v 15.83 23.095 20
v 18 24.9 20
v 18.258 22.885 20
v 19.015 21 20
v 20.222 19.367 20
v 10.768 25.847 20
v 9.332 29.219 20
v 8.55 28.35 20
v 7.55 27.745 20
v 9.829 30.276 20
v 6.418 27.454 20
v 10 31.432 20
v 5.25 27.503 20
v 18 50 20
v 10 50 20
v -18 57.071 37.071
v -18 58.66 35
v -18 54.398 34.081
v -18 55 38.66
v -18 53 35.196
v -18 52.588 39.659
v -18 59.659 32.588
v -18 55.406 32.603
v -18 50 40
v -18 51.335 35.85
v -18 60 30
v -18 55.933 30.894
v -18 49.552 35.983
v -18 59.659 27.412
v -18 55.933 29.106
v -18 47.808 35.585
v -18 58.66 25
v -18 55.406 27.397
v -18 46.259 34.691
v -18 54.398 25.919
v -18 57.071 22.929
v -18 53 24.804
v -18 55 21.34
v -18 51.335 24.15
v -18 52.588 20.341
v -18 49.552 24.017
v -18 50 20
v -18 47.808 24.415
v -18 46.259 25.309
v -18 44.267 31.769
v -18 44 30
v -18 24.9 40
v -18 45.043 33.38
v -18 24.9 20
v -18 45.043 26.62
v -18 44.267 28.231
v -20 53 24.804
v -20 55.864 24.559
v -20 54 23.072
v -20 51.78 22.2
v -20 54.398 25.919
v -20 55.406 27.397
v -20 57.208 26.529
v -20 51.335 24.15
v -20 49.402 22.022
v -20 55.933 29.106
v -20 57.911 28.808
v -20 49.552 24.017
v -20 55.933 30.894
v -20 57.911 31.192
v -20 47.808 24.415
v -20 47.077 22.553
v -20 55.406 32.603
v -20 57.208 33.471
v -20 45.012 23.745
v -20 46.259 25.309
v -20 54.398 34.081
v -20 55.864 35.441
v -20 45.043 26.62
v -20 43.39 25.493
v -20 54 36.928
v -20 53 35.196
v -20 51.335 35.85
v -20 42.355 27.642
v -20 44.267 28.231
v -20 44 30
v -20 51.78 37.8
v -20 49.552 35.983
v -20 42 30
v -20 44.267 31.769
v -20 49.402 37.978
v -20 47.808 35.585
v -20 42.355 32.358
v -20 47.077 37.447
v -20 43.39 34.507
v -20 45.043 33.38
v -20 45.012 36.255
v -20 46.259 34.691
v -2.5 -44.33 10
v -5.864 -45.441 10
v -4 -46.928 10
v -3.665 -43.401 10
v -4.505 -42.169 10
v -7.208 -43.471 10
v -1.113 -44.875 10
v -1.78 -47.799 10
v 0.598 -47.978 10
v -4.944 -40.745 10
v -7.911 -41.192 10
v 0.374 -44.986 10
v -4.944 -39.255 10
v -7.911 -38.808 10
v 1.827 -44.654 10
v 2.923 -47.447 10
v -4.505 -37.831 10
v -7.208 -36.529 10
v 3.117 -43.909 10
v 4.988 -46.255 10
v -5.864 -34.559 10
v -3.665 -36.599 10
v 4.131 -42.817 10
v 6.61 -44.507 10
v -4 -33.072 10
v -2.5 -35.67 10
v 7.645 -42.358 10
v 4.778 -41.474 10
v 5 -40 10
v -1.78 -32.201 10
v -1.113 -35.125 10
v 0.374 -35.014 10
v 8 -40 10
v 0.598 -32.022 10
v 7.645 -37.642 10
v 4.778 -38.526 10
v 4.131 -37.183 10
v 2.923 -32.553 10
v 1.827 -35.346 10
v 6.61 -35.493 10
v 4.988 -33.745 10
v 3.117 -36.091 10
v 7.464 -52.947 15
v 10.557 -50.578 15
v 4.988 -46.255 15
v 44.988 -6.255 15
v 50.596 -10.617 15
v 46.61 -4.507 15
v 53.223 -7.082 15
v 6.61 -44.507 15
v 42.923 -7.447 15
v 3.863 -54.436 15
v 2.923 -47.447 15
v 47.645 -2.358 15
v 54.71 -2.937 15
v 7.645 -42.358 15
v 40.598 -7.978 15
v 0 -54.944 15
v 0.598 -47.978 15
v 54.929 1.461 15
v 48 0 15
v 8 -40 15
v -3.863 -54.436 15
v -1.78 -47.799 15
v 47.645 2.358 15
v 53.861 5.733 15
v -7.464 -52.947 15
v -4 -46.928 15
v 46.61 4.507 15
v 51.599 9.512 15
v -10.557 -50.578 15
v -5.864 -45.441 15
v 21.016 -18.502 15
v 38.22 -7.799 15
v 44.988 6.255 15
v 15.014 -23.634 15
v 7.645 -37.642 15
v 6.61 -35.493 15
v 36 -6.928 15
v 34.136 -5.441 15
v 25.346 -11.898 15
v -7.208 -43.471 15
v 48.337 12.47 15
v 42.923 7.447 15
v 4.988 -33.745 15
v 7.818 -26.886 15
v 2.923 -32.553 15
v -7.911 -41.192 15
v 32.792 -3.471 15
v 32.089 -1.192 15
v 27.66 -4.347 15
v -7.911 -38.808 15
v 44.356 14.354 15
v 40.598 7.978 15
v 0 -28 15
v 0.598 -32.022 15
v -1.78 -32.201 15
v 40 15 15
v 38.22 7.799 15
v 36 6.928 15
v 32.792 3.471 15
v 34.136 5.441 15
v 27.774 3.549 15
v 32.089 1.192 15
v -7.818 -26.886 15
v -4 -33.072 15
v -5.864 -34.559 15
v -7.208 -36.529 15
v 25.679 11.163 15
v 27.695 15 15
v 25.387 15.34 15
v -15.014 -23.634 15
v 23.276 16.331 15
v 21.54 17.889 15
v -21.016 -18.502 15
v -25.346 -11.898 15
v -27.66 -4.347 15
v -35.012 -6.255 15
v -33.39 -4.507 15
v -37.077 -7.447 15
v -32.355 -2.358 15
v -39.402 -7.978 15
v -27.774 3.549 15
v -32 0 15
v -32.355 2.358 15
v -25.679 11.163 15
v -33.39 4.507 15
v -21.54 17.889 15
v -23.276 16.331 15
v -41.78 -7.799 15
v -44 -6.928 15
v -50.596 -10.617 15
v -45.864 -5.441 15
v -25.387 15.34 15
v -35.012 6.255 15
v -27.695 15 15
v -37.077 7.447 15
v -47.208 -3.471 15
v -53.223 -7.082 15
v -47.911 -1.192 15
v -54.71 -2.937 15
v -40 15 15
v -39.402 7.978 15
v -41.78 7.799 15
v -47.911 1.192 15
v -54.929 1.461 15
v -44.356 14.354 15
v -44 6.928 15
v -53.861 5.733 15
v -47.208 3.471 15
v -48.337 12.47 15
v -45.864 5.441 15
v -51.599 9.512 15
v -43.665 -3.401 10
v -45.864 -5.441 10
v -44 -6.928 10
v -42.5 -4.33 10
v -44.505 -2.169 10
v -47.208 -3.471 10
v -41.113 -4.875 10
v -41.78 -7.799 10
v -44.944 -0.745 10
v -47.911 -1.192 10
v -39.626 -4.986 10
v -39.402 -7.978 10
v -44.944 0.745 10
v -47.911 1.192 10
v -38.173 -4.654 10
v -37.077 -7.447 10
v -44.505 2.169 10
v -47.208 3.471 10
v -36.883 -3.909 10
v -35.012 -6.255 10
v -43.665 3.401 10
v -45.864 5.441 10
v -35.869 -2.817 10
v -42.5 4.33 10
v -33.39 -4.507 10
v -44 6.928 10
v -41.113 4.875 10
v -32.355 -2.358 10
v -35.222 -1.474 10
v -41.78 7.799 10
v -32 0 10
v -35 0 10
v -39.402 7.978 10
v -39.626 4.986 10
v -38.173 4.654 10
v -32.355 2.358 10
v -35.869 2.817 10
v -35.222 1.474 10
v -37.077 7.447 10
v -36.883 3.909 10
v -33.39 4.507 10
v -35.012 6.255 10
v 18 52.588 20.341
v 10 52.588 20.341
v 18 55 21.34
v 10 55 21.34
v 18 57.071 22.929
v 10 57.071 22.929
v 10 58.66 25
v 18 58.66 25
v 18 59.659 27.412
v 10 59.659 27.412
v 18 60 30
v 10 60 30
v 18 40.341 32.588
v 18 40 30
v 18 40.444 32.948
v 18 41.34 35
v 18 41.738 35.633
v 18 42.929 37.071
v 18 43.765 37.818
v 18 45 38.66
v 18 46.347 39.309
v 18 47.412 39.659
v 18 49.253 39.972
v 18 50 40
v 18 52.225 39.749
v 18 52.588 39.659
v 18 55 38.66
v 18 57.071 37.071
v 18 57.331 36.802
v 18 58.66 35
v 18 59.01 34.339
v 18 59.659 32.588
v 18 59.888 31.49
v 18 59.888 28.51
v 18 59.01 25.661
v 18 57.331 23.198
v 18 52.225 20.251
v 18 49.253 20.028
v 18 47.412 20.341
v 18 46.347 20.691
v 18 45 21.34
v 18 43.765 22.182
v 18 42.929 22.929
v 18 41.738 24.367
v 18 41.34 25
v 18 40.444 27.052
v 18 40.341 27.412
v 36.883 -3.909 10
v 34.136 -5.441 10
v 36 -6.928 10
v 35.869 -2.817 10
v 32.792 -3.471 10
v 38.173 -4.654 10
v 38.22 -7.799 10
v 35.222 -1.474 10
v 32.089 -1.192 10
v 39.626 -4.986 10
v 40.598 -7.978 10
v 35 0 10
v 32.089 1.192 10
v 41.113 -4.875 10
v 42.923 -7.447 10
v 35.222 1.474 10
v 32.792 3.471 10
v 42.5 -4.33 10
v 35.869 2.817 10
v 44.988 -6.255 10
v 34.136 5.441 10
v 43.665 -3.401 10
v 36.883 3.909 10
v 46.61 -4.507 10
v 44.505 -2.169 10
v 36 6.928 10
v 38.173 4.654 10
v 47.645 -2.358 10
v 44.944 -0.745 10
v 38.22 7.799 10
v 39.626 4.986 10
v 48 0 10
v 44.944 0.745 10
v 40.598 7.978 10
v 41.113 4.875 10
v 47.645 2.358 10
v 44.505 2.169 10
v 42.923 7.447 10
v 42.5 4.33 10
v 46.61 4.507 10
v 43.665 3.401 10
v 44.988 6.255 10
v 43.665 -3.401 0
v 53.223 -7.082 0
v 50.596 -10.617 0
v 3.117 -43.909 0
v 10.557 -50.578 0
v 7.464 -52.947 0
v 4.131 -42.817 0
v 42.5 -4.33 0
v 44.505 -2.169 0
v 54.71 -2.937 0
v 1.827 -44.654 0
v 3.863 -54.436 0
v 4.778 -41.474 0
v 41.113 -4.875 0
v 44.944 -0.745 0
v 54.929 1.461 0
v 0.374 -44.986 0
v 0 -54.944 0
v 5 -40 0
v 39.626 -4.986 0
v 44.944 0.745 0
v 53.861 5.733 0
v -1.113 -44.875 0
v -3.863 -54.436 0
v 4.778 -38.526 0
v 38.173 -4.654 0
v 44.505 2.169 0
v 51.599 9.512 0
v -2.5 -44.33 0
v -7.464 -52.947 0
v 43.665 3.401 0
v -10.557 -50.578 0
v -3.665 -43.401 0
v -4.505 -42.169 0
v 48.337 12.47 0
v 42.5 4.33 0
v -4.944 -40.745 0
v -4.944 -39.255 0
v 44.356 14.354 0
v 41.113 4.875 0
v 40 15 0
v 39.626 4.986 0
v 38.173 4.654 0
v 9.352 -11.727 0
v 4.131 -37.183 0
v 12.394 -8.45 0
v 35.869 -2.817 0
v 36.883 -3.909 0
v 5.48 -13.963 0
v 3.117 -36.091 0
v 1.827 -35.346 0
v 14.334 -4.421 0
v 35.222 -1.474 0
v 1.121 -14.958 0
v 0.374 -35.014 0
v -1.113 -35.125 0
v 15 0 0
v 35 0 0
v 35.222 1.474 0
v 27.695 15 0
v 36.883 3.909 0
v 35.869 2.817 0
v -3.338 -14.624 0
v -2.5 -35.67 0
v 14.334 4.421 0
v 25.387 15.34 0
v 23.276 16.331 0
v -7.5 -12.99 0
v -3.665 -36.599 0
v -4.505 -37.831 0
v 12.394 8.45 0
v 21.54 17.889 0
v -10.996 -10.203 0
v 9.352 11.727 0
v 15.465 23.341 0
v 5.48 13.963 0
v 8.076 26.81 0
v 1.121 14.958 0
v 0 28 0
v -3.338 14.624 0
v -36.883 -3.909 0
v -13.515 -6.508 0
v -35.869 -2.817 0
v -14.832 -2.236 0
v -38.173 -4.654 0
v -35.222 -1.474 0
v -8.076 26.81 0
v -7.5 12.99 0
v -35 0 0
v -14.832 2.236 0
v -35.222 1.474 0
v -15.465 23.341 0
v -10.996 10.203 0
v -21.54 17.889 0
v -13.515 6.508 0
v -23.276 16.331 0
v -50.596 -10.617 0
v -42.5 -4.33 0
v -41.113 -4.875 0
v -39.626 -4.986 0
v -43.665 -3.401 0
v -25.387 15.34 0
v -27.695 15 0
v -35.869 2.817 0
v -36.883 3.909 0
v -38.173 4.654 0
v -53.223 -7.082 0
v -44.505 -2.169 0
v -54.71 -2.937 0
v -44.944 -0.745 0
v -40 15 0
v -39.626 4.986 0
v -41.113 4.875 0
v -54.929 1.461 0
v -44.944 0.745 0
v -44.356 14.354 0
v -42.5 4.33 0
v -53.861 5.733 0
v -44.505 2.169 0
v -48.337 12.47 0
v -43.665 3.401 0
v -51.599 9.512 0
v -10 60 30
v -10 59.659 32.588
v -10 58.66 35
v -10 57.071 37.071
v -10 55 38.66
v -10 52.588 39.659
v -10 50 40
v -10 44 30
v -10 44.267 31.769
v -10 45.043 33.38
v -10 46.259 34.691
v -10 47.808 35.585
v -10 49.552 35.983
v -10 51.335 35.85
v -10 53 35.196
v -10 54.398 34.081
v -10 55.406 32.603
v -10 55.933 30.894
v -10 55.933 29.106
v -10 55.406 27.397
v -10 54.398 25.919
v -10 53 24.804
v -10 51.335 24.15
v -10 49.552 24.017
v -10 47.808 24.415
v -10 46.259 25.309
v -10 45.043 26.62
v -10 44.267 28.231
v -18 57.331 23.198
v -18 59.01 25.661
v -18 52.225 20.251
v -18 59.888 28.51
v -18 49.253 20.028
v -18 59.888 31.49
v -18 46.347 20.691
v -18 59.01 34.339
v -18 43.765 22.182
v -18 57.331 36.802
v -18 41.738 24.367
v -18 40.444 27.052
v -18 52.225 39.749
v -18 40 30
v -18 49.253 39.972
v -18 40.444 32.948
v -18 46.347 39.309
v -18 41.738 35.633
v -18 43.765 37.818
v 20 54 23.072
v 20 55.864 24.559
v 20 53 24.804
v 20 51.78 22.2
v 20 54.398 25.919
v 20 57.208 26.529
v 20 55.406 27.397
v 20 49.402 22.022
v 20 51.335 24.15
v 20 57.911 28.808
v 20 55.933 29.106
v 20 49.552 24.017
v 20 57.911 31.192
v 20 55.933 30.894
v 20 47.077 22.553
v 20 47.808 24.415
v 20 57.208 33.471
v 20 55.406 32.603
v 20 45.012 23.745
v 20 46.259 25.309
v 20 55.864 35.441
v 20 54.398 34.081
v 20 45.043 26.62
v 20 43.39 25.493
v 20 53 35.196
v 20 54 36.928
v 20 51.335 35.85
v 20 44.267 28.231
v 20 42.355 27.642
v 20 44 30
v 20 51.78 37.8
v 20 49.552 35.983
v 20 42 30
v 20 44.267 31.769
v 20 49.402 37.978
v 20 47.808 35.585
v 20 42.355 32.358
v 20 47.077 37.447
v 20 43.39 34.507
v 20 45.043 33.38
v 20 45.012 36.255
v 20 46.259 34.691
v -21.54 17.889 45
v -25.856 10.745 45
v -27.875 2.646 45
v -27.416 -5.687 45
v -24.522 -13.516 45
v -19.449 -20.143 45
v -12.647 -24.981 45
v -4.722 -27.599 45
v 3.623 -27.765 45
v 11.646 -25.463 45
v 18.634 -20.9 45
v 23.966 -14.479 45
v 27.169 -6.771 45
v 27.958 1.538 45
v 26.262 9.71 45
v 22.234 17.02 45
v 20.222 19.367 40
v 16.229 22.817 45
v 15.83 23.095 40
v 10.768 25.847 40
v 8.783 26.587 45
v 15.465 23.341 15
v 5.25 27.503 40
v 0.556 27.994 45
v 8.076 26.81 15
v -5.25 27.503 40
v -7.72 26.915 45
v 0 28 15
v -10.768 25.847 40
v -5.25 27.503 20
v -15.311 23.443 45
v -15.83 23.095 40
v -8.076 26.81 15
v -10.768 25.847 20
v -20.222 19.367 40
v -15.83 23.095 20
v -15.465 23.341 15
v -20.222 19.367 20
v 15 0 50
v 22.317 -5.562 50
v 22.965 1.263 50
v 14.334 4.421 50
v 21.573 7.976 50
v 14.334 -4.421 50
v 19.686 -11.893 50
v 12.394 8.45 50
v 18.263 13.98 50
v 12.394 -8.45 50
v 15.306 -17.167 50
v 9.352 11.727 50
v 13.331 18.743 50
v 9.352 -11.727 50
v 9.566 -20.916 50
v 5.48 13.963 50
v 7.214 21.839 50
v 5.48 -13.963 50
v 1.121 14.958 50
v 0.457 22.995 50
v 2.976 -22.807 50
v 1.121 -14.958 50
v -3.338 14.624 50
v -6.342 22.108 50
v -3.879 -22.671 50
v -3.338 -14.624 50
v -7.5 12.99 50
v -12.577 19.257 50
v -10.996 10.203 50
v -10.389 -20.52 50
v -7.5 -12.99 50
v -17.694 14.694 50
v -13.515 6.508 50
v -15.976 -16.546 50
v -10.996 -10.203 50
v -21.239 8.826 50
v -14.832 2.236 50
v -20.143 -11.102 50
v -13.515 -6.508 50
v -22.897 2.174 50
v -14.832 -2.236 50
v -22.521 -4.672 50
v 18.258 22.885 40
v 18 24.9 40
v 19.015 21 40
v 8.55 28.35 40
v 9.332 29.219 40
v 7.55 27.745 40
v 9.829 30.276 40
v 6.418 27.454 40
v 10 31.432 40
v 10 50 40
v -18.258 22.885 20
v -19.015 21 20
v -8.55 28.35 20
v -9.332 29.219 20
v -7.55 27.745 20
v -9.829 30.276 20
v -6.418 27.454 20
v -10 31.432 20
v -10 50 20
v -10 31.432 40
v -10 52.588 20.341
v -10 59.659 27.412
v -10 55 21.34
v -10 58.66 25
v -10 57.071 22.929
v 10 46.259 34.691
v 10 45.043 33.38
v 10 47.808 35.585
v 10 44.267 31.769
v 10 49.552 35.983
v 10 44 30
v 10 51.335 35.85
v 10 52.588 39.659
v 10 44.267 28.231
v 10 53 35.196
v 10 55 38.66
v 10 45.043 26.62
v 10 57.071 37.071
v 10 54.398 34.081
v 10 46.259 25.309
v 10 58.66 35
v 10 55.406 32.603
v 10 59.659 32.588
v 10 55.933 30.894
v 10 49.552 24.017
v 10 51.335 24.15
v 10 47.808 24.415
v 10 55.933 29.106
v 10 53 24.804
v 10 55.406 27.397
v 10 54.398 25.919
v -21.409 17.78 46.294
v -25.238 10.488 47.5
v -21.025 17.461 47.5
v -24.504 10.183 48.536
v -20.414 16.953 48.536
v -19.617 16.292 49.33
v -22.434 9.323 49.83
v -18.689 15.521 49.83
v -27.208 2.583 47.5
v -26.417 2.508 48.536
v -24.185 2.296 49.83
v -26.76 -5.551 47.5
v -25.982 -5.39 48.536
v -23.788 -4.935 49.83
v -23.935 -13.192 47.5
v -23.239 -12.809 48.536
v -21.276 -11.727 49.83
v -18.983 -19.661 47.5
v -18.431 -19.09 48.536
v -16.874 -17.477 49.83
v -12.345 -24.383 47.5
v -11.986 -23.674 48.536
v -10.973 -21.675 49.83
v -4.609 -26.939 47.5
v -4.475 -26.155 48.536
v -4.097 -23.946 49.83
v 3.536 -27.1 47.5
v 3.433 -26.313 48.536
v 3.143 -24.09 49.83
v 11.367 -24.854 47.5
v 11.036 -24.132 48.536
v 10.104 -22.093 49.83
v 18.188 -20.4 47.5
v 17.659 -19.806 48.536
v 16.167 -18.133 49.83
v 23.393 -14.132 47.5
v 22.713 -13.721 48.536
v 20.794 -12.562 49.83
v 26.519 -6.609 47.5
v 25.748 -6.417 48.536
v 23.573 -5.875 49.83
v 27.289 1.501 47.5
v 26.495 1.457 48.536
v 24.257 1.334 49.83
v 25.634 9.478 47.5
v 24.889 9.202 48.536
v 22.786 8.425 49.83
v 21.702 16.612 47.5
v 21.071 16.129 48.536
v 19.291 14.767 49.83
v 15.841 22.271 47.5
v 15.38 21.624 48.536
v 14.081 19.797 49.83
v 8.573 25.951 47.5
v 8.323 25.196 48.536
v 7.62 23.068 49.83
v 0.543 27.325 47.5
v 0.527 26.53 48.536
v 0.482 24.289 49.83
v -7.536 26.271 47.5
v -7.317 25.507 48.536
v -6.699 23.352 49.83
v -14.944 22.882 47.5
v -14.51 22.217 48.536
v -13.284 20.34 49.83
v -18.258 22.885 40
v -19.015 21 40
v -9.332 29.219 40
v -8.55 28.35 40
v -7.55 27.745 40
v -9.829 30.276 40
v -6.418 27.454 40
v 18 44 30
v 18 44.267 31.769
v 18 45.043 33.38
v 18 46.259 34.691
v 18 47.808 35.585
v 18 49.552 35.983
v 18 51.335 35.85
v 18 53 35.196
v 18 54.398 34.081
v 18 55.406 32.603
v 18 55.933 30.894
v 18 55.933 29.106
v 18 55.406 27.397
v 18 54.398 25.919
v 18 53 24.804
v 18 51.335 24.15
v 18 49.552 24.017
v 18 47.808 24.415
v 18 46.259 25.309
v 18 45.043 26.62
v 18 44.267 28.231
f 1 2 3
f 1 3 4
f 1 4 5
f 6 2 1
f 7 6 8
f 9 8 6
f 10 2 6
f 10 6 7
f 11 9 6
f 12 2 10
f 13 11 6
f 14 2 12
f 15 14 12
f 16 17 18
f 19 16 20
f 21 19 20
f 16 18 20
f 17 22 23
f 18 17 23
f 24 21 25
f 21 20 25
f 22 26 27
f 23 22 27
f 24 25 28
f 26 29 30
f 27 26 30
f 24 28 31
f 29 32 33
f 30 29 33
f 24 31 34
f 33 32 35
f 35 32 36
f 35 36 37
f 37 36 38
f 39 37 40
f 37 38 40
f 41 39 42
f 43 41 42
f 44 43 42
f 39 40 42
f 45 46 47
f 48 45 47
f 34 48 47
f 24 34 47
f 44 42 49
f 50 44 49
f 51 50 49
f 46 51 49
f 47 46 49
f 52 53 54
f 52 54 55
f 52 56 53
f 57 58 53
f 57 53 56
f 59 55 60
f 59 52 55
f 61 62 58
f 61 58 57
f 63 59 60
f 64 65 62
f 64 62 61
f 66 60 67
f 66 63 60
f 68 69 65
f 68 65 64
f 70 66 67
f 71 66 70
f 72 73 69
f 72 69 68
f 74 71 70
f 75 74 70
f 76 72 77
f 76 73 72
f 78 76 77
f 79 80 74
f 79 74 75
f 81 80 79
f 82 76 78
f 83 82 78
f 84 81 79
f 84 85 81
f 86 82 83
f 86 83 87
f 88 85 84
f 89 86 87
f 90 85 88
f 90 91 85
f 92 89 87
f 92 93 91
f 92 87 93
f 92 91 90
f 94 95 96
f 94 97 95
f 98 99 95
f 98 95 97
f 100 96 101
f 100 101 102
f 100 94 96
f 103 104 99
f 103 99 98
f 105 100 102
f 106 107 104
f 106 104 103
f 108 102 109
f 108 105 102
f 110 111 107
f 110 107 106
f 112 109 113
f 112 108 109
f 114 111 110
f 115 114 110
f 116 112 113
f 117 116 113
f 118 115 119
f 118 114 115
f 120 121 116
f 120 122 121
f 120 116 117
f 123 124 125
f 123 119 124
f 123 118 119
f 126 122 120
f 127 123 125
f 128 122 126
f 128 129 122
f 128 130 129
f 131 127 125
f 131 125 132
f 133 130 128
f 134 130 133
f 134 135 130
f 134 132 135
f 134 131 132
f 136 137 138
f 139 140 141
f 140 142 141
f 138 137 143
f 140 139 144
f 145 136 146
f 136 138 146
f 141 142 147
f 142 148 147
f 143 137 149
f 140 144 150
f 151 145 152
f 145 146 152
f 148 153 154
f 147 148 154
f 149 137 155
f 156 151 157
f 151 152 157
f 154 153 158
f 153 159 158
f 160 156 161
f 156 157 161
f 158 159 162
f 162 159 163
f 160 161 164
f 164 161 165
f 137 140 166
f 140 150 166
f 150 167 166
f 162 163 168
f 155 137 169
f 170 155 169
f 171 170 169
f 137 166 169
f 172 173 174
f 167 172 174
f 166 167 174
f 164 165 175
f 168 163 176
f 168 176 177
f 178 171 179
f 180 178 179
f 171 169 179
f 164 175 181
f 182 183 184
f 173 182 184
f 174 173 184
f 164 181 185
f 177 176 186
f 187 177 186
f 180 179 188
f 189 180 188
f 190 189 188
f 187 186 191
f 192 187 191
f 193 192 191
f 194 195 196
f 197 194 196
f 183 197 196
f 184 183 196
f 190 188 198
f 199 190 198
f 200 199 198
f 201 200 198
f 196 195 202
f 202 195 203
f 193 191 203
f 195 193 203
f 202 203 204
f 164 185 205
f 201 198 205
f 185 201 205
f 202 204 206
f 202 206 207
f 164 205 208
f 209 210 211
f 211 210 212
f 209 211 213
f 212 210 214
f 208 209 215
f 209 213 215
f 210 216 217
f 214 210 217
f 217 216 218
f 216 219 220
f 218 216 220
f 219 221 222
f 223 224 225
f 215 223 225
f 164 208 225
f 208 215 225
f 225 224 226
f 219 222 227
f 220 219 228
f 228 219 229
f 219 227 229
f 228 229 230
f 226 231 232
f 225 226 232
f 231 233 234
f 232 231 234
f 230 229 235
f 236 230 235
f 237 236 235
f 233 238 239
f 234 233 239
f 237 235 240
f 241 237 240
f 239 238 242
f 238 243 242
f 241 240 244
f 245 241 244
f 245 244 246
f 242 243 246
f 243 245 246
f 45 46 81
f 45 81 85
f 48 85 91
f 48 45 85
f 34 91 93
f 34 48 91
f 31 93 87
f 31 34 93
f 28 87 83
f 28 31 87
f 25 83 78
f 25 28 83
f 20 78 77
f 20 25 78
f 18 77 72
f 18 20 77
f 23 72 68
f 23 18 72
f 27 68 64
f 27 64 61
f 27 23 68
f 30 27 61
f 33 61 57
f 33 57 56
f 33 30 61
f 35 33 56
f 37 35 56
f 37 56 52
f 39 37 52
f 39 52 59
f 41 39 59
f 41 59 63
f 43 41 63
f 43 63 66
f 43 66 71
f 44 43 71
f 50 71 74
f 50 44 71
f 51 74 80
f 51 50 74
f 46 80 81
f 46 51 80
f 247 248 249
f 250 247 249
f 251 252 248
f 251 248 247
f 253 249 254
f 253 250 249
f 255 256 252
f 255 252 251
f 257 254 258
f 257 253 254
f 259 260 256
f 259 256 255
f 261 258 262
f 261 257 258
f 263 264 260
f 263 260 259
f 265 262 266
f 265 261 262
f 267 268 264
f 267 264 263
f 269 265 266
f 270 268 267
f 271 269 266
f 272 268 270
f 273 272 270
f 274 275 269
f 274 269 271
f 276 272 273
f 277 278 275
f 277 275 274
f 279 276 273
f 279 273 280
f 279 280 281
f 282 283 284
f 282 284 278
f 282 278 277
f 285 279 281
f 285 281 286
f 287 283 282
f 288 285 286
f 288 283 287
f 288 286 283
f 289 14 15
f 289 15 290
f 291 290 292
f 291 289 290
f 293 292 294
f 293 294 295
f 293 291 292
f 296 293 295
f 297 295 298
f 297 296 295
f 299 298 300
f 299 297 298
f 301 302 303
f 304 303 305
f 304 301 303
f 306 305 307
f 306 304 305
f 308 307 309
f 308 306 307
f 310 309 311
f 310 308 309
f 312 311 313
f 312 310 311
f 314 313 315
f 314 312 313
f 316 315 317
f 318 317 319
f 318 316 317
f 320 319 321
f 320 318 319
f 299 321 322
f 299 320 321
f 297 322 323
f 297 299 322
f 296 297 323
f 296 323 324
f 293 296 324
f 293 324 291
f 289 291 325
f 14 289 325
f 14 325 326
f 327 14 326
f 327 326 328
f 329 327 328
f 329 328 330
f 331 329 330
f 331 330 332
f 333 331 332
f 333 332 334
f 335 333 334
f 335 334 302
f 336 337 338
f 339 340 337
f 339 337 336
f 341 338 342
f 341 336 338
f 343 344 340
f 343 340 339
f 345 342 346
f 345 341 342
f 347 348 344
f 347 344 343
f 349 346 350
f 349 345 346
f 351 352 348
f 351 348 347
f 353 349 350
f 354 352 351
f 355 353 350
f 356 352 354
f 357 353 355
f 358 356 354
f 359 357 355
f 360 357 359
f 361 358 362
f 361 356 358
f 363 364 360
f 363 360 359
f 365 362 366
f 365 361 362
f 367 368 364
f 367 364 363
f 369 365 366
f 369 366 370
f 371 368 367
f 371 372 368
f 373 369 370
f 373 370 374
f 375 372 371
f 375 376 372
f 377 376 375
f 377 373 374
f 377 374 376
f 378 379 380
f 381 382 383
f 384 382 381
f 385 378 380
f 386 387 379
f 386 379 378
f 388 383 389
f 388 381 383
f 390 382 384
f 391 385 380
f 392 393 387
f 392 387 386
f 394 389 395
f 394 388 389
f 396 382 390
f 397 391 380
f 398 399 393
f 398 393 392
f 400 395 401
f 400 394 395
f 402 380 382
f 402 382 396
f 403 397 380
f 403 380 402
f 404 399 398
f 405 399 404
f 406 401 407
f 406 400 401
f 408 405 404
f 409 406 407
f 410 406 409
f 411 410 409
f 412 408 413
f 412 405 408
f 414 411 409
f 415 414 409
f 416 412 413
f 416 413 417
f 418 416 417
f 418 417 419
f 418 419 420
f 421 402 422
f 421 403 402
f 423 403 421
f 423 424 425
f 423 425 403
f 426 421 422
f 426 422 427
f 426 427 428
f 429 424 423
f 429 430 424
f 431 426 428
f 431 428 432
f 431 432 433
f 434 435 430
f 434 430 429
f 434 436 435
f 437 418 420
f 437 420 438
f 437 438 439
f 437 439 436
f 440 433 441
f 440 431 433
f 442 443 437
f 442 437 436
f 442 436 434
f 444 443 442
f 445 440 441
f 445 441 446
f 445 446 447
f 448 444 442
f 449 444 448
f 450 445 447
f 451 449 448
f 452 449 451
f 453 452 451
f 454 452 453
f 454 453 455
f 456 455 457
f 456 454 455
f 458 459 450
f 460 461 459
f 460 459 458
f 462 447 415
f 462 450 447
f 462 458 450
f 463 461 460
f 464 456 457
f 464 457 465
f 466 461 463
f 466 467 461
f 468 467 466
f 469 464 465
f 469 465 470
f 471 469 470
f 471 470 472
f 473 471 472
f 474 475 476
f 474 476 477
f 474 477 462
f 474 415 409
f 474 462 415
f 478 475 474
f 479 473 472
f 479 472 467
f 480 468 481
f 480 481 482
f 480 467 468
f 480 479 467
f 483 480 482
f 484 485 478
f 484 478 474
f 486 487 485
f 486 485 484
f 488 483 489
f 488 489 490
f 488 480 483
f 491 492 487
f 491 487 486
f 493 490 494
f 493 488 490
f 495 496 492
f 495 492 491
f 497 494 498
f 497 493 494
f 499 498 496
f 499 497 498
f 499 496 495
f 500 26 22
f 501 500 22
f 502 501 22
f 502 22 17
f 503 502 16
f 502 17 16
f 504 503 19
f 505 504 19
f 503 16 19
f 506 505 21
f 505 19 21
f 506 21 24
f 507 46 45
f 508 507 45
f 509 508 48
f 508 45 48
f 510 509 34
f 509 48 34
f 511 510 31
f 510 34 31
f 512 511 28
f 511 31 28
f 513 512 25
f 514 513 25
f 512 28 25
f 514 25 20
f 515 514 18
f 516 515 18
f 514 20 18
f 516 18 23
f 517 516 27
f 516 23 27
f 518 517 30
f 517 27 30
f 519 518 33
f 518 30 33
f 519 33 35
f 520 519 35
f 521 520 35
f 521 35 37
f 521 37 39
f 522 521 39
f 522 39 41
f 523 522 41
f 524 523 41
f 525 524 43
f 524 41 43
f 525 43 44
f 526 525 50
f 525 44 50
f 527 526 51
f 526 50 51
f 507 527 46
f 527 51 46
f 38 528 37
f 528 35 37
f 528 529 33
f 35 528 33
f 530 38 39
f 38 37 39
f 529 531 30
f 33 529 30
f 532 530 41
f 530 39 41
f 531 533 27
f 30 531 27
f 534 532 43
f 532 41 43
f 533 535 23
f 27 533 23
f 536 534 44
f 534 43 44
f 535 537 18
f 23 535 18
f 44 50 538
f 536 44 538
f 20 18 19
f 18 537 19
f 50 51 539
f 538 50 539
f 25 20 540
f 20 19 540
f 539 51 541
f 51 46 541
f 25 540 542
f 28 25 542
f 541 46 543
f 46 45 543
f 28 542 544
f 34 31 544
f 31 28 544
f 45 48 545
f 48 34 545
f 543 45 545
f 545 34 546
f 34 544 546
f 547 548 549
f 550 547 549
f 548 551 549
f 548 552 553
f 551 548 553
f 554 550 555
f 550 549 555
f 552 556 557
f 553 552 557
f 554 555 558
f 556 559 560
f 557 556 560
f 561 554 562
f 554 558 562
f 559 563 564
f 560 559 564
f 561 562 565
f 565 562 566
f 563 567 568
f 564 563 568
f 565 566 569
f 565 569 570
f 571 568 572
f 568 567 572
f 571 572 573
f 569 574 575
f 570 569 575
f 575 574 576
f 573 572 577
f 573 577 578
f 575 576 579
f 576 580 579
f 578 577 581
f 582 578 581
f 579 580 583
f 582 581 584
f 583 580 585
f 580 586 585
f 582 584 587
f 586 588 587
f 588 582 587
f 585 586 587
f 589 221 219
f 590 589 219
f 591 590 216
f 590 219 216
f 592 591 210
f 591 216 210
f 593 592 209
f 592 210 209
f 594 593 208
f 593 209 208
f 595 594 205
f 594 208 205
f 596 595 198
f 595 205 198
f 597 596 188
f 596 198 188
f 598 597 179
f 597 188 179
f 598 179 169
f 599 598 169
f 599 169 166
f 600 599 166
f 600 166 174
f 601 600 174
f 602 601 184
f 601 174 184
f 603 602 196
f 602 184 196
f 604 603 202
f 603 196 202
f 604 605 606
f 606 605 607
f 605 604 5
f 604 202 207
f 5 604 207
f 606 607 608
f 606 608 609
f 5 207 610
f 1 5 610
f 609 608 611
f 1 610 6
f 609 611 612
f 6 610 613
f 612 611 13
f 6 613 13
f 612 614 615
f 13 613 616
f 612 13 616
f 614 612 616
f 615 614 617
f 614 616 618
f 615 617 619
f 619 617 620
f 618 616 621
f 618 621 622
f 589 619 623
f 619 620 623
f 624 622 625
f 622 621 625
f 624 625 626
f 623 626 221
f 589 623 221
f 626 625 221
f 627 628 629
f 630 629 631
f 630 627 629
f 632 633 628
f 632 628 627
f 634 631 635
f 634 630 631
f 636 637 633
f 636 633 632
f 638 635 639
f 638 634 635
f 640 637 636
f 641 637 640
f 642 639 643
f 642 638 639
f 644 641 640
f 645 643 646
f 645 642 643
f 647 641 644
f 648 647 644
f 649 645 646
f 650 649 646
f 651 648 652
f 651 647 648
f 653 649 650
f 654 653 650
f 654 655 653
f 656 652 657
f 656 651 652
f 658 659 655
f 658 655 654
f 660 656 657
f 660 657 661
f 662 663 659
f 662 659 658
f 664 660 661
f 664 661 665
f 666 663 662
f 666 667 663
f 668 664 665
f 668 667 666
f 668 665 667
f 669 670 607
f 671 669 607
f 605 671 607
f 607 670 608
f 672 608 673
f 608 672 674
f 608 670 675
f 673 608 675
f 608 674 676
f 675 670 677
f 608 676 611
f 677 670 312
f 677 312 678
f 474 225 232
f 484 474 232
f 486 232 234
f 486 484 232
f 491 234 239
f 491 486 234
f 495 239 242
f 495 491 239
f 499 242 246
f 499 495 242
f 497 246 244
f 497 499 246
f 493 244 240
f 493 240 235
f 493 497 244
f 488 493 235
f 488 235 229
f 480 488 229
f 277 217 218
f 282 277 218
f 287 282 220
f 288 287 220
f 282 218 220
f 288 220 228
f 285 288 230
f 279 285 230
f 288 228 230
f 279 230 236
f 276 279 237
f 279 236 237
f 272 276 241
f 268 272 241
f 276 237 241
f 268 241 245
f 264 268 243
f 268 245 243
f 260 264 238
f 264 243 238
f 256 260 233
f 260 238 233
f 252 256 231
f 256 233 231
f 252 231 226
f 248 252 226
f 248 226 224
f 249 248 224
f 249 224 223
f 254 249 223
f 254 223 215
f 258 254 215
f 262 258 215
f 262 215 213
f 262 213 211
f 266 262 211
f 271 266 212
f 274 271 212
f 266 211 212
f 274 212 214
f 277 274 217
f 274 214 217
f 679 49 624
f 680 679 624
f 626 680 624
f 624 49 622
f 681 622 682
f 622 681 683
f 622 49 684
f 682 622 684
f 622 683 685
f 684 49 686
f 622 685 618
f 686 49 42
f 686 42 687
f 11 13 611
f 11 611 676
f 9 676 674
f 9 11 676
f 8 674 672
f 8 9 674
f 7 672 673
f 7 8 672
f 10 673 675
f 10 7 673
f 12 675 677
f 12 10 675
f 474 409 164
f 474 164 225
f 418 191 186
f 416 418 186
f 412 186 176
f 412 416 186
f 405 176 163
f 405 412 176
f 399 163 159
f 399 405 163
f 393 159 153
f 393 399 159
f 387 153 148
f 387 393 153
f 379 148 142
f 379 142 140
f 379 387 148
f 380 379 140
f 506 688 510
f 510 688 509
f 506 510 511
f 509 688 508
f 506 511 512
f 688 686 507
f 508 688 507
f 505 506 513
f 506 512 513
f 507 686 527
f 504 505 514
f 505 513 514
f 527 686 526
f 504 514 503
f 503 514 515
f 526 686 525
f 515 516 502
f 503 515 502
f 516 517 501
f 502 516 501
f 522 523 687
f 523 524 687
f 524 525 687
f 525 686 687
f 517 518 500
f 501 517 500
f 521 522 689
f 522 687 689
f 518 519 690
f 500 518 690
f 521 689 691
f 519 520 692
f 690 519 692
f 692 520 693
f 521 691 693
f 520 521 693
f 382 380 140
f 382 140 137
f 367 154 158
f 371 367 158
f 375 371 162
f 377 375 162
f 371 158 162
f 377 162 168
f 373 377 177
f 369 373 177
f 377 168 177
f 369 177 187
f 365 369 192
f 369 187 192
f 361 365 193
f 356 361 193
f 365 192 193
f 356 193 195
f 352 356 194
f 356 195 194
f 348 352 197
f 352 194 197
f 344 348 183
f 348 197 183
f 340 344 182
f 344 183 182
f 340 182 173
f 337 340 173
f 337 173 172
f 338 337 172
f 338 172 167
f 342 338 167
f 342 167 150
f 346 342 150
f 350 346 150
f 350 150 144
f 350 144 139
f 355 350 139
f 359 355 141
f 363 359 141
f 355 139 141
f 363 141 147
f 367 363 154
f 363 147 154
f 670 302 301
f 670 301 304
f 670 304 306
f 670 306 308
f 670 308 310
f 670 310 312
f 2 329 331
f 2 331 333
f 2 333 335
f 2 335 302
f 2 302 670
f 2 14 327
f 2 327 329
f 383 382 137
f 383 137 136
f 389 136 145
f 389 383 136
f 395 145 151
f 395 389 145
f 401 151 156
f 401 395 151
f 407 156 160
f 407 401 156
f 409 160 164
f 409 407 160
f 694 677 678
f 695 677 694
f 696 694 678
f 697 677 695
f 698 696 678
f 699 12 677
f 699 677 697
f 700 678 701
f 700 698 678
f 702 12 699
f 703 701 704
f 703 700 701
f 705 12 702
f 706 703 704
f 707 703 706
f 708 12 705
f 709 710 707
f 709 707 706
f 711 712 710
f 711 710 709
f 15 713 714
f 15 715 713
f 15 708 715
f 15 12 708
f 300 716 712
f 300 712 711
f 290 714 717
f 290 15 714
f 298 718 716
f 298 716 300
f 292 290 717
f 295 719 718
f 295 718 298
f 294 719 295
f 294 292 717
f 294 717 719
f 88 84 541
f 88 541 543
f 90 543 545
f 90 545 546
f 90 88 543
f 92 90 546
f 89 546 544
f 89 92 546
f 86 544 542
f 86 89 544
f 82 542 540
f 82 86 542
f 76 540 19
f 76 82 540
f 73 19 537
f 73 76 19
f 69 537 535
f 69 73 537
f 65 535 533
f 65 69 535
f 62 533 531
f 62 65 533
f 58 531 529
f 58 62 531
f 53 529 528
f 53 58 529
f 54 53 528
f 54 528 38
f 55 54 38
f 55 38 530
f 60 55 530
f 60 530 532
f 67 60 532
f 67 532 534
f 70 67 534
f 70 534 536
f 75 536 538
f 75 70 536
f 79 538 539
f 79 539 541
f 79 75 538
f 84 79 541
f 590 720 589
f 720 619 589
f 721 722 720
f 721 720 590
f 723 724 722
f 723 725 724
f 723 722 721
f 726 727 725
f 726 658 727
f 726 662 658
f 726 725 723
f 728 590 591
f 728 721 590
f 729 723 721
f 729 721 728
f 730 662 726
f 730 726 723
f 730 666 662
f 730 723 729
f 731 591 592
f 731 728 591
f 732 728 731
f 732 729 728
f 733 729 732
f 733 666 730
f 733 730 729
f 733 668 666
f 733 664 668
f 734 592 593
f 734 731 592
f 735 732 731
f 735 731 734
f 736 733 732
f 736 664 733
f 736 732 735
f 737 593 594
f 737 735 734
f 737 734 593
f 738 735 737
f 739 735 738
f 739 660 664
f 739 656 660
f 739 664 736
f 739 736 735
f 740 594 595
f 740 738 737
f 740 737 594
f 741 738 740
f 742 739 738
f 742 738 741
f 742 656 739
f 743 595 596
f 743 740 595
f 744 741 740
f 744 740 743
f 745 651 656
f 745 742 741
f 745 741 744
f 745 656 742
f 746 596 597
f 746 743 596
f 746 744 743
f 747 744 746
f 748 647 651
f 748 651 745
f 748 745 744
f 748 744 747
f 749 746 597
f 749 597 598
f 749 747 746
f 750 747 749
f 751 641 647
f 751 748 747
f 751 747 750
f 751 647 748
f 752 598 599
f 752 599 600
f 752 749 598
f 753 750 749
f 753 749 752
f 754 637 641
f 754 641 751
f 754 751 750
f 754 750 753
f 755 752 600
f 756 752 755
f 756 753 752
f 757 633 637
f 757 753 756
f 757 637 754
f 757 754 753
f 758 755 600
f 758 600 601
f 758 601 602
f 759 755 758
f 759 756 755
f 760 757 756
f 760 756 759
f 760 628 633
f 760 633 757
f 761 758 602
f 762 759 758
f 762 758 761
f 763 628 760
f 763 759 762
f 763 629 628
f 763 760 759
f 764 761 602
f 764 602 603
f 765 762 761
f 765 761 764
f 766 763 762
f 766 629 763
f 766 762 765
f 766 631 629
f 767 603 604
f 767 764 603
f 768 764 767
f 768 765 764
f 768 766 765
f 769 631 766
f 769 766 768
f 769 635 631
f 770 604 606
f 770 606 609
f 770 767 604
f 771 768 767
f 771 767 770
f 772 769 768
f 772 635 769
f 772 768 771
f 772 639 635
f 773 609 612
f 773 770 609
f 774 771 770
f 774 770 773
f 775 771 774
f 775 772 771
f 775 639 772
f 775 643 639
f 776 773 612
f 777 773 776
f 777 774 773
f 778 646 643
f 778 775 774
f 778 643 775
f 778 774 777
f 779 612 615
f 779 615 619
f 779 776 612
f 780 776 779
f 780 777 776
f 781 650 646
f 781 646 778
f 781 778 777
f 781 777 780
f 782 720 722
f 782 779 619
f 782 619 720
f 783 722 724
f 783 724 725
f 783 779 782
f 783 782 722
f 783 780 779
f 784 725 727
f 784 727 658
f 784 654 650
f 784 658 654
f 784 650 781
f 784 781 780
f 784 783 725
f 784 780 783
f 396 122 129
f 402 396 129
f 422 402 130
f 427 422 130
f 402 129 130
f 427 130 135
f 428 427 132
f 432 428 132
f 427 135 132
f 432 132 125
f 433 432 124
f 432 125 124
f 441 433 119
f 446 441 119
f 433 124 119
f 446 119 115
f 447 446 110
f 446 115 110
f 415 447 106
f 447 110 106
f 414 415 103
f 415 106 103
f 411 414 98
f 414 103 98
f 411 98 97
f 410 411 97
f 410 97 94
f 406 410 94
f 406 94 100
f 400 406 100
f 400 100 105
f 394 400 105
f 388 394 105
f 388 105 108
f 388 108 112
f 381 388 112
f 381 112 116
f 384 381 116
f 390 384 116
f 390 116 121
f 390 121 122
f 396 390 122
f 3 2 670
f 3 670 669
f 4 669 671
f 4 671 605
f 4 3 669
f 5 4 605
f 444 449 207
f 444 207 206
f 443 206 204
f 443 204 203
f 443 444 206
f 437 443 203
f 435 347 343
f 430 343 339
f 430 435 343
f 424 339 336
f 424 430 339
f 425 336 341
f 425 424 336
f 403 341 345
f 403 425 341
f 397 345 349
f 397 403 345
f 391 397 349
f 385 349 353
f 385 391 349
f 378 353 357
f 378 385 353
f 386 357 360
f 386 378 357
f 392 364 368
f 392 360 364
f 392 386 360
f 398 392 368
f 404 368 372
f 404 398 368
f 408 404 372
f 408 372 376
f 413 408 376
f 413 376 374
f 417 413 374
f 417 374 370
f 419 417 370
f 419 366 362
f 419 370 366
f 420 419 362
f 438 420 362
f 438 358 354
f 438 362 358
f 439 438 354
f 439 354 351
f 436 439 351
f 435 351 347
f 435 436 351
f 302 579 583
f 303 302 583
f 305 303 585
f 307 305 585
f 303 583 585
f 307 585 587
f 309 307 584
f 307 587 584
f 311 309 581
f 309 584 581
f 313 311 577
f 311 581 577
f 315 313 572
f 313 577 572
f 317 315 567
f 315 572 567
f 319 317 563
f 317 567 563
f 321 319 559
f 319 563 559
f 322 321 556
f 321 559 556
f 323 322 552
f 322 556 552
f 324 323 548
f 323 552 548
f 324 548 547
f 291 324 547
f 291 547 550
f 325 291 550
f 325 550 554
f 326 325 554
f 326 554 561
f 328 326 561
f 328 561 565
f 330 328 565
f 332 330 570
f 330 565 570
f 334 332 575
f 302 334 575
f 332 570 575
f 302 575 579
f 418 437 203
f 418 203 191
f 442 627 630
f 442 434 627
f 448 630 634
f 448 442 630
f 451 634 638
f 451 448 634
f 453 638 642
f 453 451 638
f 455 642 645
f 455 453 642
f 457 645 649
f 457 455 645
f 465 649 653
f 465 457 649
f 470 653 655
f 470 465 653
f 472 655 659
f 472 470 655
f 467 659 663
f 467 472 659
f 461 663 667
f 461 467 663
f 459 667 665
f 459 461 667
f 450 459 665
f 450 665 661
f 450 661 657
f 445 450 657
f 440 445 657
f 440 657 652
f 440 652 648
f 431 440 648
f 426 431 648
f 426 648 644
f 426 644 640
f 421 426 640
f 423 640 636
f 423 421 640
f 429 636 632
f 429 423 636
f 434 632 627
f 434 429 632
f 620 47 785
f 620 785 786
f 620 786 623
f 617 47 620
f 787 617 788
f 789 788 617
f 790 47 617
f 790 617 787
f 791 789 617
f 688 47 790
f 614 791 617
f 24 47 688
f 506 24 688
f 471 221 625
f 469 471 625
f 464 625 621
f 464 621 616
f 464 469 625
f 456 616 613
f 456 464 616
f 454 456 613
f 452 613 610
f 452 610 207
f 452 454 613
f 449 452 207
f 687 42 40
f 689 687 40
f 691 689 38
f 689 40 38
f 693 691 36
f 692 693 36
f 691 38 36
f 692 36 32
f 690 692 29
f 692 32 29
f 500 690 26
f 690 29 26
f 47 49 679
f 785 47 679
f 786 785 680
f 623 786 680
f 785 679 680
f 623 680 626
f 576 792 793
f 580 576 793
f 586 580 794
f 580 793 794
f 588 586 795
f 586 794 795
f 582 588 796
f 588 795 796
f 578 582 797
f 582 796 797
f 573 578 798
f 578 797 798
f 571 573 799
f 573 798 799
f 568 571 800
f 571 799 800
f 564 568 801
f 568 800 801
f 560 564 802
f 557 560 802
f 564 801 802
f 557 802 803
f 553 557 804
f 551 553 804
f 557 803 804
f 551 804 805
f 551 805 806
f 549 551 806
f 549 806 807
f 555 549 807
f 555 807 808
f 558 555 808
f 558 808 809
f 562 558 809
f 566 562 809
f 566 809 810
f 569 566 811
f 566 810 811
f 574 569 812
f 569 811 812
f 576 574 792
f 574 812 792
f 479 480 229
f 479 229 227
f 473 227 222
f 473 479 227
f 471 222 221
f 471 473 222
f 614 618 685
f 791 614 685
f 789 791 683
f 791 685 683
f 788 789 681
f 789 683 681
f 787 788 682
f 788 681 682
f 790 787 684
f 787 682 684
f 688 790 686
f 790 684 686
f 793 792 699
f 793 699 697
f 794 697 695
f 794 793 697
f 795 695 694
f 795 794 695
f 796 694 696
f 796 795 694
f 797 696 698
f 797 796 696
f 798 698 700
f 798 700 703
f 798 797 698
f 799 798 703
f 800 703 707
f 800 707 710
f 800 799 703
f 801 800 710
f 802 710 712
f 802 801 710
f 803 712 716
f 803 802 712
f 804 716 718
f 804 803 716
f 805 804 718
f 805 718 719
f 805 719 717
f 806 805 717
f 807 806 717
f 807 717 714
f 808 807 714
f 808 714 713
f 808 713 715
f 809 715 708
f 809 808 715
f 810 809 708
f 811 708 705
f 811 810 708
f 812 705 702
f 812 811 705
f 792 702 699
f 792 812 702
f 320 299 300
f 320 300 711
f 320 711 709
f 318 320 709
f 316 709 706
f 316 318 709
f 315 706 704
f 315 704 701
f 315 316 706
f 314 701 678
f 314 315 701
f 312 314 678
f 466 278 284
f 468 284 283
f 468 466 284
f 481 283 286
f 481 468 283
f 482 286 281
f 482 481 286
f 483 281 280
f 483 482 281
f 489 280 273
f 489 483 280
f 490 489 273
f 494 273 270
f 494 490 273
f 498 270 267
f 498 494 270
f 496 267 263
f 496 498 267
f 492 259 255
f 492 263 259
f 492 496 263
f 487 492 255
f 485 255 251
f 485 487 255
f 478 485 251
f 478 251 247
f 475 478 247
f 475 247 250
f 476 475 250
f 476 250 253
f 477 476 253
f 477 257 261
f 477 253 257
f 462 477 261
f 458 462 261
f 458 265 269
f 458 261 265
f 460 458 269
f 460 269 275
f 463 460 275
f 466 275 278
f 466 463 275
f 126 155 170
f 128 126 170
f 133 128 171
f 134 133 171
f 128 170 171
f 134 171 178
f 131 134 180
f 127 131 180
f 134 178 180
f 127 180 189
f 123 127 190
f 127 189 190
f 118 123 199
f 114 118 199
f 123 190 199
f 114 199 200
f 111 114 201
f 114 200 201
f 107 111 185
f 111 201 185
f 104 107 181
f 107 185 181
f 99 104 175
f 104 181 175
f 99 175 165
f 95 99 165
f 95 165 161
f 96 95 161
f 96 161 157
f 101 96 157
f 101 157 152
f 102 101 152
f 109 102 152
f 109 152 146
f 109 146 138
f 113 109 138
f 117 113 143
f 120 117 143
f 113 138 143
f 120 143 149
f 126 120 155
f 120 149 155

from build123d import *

# Parameters (mm, degrees)
IZIM1_R                     = 15
IZIM1_R_2                   = 5
Y_KSEKLIK_EKSTR_ZYON1_DEPTH = 15
IZIM2_R                     = 28
IZIM2_R_2                   = 15
Y_KSEKLIK_EKSTR_ZYON2_DEPTH = 35
RADYUS1_R                   = 5
IZIM3_R                     = 5
KES_EKSTR_ZYON1_DEPTH       = 15
IZIM4_R                     = 8
KES_EKSTR_ZYON2_DEPTH       = 5
Y_KSEKLIK_EKSTR_ZYON3_START = -20
Y_KSEKLIK_EKSTR_ZYON3_DEPTH = 20
IZIM6_R                     = 6
KES_EKSTR_ZYON3_DEPTH       = 8
IZIM7_R                     = 10
IZIM7_R_2                   = 6
Y_KSEKLIK_EKSTR_ZYON4_DEPTH = 2
PAH1_SIZE                   = 2
PAH1_OF_AYNALAMA1_SIZE      = 2


with BuildPart() as part:
    # Çizim1 → Yükseklik-Ekstrüzyon1 (new body)
    with BuildSketch(Plane.XY):
        with BuildLine():
            Line((-10.556856631, -50.577645382), (-50.596163509, -10.617029664))
            ThreePointArc((-50.596163509, -10.617029664), (-53.861014482, 5.733435054), (-40, 15))
            Line((-40, 15), (-27.694764848, 15))
            ThreePointArc((-27.694764848, 15), (-24.295418506, 15.758146339), (-21.54037266, 17.888888889))
            ThreePointArc((-21.54037266, 17.888888889), (0, 28), (21.54037266, 17.888888889))
            ThreePointArc((21.54037266, 17.888888889), (24.295418506, 15.758146339), (27.694764848, 15))
            Line((27.694764848, 15), (40, 15))
            ThreePointArc((40, 15), (53.861014482, 5.733435054), (50.596163509, -10.617029664))
            Line((50.596163509, -10.617029664), (10.556856631, -50.577645382))
            ThreePointArc((10.556856631, -50.577645382), (0, -54.94435692), (-10.556856631, -50.577645382))
        make_face()
        Circle(IZIM1_R, mode=Mode.SUBTRACT)
        with Locations((-40, 0)):
            Circle(IZIM1_R_2, mode=Mode.SUBTRACT)
        with Locations(Location((40, 0, 0), (0, 0, 180))):
            Circle(IZIM1_R_2, mode=Mode.SUBTRACT)
    extrude(amount=Y_KSEKLIK_EKSTR_ZYON1_DEPTH)

    # Çizim2 → Yükseklik-Ekstrüzyon2 (add)
    with BuildSketch(Plane.XY.offset(15)):
        with Locations(Location((0, 0, 0), (0, 0, 140.290983447))):
            Circle(IZIM2_R)
        Circle(IZIM2_R_2, mode=Mode.SUBTRACT)
    extrude(amount=Y_KSEKLIK_EKSTR_ZYON2_DEPTH)

    # Radyus1
    radyus1_edges = [part.edges().sort_by_distance(p)[0] for p in [
        (21.54037266, -17.888888889, 50),
    ]]
    fillet(radyus1_edges, radius=RADYUS1_R)

    # Çizim3 → Kes-Ekstrüzyon1 (cut)
    with BuildSketch(Plane.XY.offset(15)):
        with Locations((0, -40)):
            Circle(IZIM3_R)
    extrude(amount=-KES_EKSTR_ZYON1_DEPTH, mode=Mode.SUBTRACT)

    # Çizim4 → Kes-Ekstrüzyon2 (cut)
    with BuildSketch(Plane.XY.offset(15)):
        with Locations((-40, 0)):
            Circle(IZIM4_R)
        with Locations((0, -40)):
            Circle(IZIM4_R)
        with Locations((40, 0)):
            Circle(IZIM4_R)
    extrude(amount=-KES_EKSTR_ZYON2_DEPTH, mode=Mode.SUBTRACT)

    # Çizim5 → Yükseklik-Ekstrüzyon3 (add)
    with BuildSketch(Plane.XY.offset(40).offset(Y_KSEKLIK_EKSTR_ZYON3_START)):
        with BuildLine():
            Line((-18, 60), (-18, 24.899799196))
            ThreePointArc((-18, 24.899799196), (-18.576314183, 21.918375226), (-20.222222222, 19.366510486))
            ThreePointArc((-20.222222222, 19.366510486), (-13.370146039, 24.6016096), (-5.25, 27.50340888))
            ThreePointArc((-5.25, 27.50340888), (-8.549509757, 28.35026029), (-10, 31.432467291))
            Line((-10, 31.432467291), (-10, 60))
            Line((-10, 60), (-18, 60))
        make_face()
    y_kseklik_ekstr_zyon3 = extrude(amount=Y_KSEKLIK_EKSTR_ZYON3_DEPTH)

    # Çizim6 → Kes-Ekstrüzyon3 (cut)
    with BuildSketch(Plane.ZY.offset(18)):
        with BuildLine():
            Line((40, 50), (40, 60))
            Line((40, 60), (30, 60))
            ThreePointArc((30, 60), (37.071067812, 57.071067812), (40, 50))
        make_face()
        with BuildLine():
            ThreePointArc((20, 50), (22.928932188, 57.071067812), (30, 60))
            Line((30, 60), (20, 60))
            Line((20, 60), (20, 50))
        make_face()
        with Locations(Location((30, 50, 0), (0, 0, 270))):
            Circle(IZIM6_R)
    kes_ekstr_zyon3 = extrude(amount=-KES_EKSTR_ZYON3_DEPTH, mode=Mode.SUBTRACT)


with BuildPart() as body_2:
    # Çizim7 → Yükseklik-Ekstrüzyon4 (new body)
    with BuildSketch(Plane.ZY.offset(18)):
        with Locations(Location((30, 50, 0), (0, 0, 270))):
            Circle(IZIM7_R)
        with Locations(Location((30, 50, 0), (0, 0, 270))):
            Circle(IZIM7_R_2, mode=Mode.SUBTRACT)
    y_kseklik_ekstr_zyon4 = extrude(amount=Y_KSEKLIK_EKSTR_ZYON4_DEPTH)

    # Pah1
    pah1_edges = [body_2.edges().sort_by_distance(p)[0] for p in [
        (-20, 60, 30),
    ]]
    chamfer(pah1_edges, length=PAH1_SIZE - 0.0001)  # a hair under: the kernel refuses the full size


with BuildPart() as part_1:
    add(part.part)

    # Aynalama1: Yükseklik-Ekstrüzyon3, Kes-Ekstrüzyon3, Yükseklik-Ekstrüzyon4 across plane
    add(y_kseklik_ekstr_zyon3.mirror(Plane(origin=(0, 0, 0), x_dir=(0, 0, 1), z_dir=(1, 0, 0))))
    add(kes_ekstr_zyon3.mirror(Plane(origin=(0, 0, 0), x_dir=(0, 0, 1), z_dir=(1, 0, 0))), mode=Mode.SUBTRACT)
    add(y_kseklik_ekstr_zyon4.mirror(Plane(origin=(0, 0, 0), x_dir=(0, 0, 1), z_dir=(1, 0, 0))))

    # Pah1 of Aynalama1
    pah1_of_aynalama1_edges = [part_1.edges().sort_by_distance(p)[0] for p in [
        (20, 60, 30),
    ]]
    chamfer(pah1_of_aynalama1_edges, length=PAH1_OF_AYNALAMA1_SIZE - 0.0001)  # a hair under: the kernel refuses the full size


solid = Compound([body_2.part, part_1.part])
